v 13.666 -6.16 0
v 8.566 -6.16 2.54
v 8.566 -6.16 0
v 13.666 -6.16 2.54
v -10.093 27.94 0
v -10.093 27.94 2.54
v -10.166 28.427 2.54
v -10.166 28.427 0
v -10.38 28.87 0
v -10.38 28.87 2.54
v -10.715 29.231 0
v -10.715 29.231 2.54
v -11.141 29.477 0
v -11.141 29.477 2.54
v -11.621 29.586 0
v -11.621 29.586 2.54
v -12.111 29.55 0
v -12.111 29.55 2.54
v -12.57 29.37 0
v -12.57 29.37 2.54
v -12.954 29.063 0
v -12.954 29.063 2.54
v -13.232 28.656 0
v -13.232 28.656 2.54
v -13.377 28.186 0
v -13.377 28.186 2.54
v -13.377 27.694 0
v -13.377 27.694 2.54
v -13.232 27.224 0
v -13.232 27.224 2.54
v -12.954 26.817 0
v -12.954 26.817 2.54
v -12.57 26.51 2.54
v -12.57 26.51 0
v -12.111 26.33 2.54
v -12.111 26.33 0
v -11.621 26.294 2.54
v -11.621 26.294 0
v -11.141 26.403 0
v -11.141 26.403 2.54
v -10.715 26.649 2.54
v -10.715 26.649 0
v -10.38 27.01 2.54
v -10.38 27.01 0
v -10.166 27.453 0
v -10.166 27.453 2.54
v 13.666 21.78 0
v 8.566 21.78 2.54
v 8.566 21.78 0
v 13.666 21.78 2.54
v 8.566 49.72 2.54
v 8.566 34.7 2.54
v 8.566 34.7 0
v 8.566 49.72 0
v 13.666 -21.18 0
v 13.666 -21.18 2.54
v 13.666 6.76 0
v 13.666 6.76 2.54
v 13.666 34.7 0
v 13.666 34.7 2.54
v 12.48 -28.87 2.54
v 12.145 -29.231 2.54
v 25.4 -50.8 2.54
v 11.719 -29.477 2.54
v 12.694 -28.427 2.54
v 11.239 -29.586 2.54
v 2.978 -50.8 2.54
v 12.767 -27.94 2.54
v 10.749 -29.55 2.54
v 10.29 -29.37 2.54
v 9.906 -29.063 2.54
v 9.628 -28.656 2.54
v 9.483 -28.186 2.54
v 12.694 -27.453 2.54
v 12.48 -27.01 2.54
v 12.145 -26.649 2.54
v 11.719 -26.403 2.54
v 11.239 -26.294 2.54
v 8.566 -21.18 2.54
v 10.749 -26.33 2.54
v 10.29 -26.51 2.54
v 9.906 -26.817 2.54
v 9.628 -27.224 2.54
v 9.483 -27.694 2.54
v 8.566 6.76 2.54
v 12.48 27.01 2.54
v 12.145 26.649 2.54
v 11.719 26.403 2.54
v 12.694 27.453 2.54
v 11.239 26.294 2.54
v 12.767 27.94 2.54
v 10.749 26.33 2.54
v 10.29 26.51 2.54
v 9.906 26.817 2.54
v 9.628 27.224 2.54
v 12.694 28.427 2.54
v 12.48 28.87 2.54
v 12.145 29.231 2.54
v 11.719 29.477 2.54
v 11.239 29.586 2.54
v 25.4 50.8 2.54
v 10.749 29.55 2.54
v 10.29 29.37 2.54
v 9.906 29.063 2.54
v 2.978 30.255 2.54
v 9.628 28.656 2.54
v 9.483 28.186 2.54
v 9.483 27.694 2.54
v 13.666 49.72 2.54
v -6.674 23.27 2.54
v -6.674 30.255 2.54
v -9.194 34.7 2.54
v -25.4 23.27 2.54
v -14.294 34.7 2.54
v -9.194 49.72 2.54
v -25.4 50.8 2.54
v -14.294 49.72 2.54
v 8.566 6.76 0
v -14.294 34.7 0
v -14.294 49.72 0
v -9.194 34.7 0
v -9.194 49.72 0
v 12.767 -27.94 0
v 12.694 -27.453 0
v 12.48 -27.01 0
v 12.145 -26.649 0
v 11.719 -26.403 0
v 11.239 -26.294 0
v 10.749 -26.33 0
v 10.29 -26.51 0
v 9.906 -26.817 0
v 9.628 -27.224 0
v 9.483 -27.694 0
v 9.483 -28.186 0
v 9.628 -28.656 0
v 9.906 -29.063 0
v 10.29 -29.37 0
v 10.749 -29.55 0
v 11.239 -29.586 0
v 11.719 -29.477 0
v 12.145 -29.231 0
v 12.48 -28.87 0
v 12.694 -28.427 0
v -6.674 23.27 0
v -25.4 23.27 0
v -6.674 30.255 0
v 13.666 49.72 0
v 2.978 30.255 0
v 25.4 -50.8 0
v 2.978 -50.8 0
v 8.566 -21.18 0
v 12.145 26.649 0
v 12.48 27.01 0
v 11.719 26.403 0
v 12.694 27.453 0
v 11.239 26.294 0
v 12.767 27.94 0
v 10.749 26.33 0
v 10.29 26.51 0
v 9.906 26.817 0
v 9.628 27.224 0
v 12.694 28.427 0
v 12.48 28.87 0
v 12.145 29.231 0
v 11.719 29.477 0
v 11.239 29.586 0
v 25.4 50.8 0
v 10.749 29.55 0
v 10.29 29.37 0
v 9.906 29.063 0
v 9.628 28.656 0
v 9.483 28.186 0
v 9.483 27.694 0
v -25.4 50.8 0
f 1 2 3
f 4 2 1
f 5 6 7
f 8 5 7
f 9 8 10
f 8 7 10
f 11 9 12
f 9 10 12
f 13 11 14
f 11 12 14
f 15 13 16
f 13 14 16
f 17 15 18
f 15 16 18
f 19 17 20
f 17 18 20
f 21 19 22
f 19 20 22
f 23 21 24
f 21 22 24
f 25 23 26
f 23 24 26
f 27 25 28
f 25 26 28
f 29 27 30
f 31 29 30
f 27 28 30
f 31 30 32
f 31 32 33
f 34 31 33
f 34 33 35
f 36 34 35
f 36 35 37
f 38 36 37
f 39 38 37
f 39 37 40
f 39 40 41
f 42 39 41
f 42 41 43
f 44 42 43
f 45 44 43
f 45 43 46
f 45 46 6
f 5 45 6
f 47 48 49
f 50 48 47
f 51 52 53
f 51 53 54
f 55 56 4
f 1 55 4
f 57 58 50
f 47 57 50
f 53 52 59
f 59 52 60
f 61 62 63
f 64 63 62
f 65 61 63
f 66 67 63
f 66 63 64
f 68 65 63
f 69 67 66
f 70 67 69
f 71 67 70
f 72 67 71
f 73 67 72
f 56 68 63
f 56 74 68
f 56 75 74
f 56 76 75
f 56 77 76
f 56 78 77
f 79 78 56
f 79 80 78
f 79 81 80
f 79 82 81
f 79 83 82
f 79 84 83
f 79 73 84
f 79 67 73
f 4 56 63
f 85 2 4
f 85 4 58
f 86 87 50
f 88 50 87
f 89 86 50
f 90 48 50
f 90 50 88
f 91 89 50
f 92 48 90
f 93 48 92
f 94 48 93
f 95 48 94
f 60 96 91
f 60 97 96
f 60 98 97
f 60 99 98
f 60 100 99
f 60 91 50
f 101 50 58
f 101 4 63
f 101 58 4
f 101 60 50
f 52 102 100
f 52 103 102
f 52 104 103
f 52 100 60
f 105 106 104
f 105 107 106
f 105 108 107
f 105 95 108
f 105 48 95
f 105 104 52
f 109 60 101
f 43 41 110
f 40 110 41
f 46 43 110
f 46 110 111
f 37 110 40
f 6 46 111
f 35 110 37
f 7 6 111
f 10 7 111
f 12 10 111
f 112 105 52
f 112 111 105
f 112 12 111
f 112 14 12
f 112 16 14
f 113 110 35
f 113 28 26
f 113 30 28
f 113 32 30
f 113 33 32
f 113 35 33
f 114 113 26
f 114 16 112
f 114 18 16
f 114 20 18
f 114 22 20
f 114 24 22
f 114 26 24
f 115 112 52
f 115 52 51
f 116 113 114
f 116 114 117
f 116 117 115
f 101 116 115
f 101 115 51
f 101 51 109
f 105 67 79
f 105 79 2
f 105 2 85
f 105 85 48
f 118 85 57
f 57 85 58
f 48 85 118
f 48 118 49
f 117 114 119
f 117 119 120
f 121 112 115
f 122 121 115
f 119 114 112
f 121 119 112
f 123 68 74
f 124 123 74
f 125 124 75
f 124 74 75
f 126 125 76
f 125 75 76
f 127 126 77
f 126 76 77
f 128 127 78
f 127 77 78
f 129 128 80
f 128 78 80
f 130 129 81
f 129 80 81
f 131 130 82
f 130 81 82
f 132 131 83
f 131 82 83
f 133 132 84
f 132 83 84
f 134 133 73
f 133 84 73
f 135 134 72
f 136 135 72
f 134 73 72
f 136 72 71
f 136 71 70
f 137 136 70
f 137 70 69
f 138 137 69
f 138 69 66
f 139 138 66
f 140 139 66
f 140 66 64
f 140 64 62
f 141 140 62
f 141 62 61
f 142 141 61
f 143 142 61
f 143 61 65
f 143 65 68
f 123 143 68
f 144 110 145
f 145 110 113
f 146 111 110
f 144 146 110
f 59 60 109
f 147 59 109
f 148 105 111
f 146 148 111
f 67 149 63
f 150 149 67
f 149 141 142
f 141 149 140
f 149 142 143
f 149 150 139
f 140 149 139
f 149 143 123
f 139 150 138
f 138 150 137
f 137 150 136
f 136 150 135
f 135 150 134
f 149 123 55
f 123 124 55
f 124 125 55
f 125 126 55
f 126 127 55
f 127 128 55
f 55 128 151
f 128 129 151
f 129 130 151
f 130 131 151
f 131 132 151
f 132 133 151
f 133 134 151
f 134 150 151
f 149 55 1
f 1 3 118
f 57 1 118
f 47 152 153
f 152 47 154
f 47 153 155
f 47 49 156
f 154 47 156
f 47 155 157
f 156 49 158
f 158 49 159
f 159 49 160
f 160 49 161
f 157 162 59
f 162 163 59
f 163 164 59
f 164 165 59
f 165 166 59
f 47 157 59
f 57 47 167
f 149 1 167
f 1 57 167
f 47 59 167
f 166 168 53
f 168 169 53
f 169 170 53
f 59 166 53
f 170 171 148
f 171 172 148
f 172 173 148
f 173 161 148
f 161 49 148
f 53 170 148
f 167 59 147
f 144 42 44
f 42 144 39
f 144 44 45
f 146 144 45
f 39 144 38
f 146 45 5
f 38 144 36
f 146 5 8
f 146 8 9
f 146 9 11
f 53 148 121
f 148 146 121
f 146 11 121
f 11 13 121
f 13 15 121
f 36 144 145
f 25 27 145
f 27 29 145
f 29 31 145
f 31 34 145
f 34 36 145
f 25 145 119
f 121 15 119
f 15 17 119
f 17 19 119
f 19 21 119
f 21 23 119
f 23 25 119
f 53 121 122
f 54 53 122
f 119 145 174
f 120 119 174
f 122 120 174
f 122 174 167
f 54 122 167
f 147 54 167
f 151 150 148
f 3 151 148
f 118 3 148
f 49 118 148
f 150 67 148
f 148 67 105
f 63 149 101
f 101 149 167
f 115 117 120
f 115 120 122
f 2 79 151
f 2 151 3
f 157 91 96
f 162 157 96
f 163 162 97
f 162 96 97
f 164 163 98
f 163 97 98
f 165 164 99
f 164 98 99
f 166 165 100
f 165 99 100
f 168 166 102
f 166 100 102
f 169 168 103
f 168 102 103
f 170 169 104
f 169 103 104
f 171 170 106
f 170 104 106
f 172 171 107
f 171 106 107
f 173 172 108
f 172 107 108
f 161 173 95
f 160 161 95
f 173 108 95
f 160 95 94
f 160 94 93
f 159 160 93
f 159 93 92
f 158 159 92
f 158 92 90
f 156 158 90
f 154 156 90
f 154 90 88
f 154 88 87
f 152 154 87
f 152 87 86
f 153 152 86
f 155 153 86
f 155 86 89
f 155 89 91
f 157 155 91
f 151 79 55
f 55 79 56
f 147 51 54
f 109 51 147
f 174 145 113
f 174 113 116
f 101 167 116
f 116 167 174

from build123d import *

# Parameters (mm, degrees)
SKETCH1_W           = 101.6
SKETCH1_H           = 50.8
BOSS_EXTRUDE1_DEPTH = 2.54
SKETCH2_R           = 1.651
CUT_EXTRUDE1_DEPTH  = 57.852894385
SKETCH3_W           = 5.1
SKETCH3_H           = 15.02
CUT_EXTRUDE4_DEPTH  = 57.852894385
CUT_EXTRUDE5_DEPTH  = 57.852894385


with BuildPart() as part:
    # Sketch1 → Boss-Extrude1 (new body)
    with BuildSketch(Plane(origin=(0, 0, 0), x_dir=(0, 1, 0), z_dir=(0, 0, 1))):
        Rectangle(SKETCH1_W, SKETCH1_H)
    extrude(amount=BOSS_EXTRUDE1_DEPTH)

    # Sketch2 → Cut-Extrude1 (cut, through all)
    with BuildSketch(Plane.XY.offset(2.54)):
        with Locations((11.115903034, 27.94)):
            Circle(SKETCH2_R)
        with Locations((11.115903034, -27.94)):
            Circle(SKETCH2_R)
        with Locations((-11.744096966, 27.94)):
            Circle(SKETCH2_R)
    extrude(amount=-CUT_EXTRUDE1_DEPTH, mode=Mode.SUBTRACT)

    # Sketch3 → Cut-Extrude4 (cut, through all)
    with BuildSketch(Plane.XY.offset(2.54)):
        with Locations((11.115903034, -13.67)):
            Rectangle(SKETCH3_W, SKETCH3_H)
        with Locations((11.115903034, 14.27)):
            Rectangle(SKETCH3_W, SKETCH3_H)
        with Locations((11.115903034, 42.21)):
            Rectangle(SKETCH3_W, SKETCH3_H)
        with Locations((-11.744096966, 42.21)):
            Rectangle(SKETCH3_W, SKETCH3_H)
    extrude(amount=-CUT_EXTRUDE4_DEPTH, mode=Mode.SUBTRACT)

    # Sketch5 → Cut-Extrude5 (cut, through all)
    with BuildSketch(Plane.XY.offset(2.54)):
        Polygon((2.977903034, -50.8), (2.977903034, 30.255), (-6.674096966, 30.255), (-6.674096966, 23.27), (-25.4, 23.27), (-25.4, -50.8), align=None)
    extrude(amount=-CUT_EXTRUDE5_DEPTH, mode=Mode.SUBTRACT)


solid = part.part
